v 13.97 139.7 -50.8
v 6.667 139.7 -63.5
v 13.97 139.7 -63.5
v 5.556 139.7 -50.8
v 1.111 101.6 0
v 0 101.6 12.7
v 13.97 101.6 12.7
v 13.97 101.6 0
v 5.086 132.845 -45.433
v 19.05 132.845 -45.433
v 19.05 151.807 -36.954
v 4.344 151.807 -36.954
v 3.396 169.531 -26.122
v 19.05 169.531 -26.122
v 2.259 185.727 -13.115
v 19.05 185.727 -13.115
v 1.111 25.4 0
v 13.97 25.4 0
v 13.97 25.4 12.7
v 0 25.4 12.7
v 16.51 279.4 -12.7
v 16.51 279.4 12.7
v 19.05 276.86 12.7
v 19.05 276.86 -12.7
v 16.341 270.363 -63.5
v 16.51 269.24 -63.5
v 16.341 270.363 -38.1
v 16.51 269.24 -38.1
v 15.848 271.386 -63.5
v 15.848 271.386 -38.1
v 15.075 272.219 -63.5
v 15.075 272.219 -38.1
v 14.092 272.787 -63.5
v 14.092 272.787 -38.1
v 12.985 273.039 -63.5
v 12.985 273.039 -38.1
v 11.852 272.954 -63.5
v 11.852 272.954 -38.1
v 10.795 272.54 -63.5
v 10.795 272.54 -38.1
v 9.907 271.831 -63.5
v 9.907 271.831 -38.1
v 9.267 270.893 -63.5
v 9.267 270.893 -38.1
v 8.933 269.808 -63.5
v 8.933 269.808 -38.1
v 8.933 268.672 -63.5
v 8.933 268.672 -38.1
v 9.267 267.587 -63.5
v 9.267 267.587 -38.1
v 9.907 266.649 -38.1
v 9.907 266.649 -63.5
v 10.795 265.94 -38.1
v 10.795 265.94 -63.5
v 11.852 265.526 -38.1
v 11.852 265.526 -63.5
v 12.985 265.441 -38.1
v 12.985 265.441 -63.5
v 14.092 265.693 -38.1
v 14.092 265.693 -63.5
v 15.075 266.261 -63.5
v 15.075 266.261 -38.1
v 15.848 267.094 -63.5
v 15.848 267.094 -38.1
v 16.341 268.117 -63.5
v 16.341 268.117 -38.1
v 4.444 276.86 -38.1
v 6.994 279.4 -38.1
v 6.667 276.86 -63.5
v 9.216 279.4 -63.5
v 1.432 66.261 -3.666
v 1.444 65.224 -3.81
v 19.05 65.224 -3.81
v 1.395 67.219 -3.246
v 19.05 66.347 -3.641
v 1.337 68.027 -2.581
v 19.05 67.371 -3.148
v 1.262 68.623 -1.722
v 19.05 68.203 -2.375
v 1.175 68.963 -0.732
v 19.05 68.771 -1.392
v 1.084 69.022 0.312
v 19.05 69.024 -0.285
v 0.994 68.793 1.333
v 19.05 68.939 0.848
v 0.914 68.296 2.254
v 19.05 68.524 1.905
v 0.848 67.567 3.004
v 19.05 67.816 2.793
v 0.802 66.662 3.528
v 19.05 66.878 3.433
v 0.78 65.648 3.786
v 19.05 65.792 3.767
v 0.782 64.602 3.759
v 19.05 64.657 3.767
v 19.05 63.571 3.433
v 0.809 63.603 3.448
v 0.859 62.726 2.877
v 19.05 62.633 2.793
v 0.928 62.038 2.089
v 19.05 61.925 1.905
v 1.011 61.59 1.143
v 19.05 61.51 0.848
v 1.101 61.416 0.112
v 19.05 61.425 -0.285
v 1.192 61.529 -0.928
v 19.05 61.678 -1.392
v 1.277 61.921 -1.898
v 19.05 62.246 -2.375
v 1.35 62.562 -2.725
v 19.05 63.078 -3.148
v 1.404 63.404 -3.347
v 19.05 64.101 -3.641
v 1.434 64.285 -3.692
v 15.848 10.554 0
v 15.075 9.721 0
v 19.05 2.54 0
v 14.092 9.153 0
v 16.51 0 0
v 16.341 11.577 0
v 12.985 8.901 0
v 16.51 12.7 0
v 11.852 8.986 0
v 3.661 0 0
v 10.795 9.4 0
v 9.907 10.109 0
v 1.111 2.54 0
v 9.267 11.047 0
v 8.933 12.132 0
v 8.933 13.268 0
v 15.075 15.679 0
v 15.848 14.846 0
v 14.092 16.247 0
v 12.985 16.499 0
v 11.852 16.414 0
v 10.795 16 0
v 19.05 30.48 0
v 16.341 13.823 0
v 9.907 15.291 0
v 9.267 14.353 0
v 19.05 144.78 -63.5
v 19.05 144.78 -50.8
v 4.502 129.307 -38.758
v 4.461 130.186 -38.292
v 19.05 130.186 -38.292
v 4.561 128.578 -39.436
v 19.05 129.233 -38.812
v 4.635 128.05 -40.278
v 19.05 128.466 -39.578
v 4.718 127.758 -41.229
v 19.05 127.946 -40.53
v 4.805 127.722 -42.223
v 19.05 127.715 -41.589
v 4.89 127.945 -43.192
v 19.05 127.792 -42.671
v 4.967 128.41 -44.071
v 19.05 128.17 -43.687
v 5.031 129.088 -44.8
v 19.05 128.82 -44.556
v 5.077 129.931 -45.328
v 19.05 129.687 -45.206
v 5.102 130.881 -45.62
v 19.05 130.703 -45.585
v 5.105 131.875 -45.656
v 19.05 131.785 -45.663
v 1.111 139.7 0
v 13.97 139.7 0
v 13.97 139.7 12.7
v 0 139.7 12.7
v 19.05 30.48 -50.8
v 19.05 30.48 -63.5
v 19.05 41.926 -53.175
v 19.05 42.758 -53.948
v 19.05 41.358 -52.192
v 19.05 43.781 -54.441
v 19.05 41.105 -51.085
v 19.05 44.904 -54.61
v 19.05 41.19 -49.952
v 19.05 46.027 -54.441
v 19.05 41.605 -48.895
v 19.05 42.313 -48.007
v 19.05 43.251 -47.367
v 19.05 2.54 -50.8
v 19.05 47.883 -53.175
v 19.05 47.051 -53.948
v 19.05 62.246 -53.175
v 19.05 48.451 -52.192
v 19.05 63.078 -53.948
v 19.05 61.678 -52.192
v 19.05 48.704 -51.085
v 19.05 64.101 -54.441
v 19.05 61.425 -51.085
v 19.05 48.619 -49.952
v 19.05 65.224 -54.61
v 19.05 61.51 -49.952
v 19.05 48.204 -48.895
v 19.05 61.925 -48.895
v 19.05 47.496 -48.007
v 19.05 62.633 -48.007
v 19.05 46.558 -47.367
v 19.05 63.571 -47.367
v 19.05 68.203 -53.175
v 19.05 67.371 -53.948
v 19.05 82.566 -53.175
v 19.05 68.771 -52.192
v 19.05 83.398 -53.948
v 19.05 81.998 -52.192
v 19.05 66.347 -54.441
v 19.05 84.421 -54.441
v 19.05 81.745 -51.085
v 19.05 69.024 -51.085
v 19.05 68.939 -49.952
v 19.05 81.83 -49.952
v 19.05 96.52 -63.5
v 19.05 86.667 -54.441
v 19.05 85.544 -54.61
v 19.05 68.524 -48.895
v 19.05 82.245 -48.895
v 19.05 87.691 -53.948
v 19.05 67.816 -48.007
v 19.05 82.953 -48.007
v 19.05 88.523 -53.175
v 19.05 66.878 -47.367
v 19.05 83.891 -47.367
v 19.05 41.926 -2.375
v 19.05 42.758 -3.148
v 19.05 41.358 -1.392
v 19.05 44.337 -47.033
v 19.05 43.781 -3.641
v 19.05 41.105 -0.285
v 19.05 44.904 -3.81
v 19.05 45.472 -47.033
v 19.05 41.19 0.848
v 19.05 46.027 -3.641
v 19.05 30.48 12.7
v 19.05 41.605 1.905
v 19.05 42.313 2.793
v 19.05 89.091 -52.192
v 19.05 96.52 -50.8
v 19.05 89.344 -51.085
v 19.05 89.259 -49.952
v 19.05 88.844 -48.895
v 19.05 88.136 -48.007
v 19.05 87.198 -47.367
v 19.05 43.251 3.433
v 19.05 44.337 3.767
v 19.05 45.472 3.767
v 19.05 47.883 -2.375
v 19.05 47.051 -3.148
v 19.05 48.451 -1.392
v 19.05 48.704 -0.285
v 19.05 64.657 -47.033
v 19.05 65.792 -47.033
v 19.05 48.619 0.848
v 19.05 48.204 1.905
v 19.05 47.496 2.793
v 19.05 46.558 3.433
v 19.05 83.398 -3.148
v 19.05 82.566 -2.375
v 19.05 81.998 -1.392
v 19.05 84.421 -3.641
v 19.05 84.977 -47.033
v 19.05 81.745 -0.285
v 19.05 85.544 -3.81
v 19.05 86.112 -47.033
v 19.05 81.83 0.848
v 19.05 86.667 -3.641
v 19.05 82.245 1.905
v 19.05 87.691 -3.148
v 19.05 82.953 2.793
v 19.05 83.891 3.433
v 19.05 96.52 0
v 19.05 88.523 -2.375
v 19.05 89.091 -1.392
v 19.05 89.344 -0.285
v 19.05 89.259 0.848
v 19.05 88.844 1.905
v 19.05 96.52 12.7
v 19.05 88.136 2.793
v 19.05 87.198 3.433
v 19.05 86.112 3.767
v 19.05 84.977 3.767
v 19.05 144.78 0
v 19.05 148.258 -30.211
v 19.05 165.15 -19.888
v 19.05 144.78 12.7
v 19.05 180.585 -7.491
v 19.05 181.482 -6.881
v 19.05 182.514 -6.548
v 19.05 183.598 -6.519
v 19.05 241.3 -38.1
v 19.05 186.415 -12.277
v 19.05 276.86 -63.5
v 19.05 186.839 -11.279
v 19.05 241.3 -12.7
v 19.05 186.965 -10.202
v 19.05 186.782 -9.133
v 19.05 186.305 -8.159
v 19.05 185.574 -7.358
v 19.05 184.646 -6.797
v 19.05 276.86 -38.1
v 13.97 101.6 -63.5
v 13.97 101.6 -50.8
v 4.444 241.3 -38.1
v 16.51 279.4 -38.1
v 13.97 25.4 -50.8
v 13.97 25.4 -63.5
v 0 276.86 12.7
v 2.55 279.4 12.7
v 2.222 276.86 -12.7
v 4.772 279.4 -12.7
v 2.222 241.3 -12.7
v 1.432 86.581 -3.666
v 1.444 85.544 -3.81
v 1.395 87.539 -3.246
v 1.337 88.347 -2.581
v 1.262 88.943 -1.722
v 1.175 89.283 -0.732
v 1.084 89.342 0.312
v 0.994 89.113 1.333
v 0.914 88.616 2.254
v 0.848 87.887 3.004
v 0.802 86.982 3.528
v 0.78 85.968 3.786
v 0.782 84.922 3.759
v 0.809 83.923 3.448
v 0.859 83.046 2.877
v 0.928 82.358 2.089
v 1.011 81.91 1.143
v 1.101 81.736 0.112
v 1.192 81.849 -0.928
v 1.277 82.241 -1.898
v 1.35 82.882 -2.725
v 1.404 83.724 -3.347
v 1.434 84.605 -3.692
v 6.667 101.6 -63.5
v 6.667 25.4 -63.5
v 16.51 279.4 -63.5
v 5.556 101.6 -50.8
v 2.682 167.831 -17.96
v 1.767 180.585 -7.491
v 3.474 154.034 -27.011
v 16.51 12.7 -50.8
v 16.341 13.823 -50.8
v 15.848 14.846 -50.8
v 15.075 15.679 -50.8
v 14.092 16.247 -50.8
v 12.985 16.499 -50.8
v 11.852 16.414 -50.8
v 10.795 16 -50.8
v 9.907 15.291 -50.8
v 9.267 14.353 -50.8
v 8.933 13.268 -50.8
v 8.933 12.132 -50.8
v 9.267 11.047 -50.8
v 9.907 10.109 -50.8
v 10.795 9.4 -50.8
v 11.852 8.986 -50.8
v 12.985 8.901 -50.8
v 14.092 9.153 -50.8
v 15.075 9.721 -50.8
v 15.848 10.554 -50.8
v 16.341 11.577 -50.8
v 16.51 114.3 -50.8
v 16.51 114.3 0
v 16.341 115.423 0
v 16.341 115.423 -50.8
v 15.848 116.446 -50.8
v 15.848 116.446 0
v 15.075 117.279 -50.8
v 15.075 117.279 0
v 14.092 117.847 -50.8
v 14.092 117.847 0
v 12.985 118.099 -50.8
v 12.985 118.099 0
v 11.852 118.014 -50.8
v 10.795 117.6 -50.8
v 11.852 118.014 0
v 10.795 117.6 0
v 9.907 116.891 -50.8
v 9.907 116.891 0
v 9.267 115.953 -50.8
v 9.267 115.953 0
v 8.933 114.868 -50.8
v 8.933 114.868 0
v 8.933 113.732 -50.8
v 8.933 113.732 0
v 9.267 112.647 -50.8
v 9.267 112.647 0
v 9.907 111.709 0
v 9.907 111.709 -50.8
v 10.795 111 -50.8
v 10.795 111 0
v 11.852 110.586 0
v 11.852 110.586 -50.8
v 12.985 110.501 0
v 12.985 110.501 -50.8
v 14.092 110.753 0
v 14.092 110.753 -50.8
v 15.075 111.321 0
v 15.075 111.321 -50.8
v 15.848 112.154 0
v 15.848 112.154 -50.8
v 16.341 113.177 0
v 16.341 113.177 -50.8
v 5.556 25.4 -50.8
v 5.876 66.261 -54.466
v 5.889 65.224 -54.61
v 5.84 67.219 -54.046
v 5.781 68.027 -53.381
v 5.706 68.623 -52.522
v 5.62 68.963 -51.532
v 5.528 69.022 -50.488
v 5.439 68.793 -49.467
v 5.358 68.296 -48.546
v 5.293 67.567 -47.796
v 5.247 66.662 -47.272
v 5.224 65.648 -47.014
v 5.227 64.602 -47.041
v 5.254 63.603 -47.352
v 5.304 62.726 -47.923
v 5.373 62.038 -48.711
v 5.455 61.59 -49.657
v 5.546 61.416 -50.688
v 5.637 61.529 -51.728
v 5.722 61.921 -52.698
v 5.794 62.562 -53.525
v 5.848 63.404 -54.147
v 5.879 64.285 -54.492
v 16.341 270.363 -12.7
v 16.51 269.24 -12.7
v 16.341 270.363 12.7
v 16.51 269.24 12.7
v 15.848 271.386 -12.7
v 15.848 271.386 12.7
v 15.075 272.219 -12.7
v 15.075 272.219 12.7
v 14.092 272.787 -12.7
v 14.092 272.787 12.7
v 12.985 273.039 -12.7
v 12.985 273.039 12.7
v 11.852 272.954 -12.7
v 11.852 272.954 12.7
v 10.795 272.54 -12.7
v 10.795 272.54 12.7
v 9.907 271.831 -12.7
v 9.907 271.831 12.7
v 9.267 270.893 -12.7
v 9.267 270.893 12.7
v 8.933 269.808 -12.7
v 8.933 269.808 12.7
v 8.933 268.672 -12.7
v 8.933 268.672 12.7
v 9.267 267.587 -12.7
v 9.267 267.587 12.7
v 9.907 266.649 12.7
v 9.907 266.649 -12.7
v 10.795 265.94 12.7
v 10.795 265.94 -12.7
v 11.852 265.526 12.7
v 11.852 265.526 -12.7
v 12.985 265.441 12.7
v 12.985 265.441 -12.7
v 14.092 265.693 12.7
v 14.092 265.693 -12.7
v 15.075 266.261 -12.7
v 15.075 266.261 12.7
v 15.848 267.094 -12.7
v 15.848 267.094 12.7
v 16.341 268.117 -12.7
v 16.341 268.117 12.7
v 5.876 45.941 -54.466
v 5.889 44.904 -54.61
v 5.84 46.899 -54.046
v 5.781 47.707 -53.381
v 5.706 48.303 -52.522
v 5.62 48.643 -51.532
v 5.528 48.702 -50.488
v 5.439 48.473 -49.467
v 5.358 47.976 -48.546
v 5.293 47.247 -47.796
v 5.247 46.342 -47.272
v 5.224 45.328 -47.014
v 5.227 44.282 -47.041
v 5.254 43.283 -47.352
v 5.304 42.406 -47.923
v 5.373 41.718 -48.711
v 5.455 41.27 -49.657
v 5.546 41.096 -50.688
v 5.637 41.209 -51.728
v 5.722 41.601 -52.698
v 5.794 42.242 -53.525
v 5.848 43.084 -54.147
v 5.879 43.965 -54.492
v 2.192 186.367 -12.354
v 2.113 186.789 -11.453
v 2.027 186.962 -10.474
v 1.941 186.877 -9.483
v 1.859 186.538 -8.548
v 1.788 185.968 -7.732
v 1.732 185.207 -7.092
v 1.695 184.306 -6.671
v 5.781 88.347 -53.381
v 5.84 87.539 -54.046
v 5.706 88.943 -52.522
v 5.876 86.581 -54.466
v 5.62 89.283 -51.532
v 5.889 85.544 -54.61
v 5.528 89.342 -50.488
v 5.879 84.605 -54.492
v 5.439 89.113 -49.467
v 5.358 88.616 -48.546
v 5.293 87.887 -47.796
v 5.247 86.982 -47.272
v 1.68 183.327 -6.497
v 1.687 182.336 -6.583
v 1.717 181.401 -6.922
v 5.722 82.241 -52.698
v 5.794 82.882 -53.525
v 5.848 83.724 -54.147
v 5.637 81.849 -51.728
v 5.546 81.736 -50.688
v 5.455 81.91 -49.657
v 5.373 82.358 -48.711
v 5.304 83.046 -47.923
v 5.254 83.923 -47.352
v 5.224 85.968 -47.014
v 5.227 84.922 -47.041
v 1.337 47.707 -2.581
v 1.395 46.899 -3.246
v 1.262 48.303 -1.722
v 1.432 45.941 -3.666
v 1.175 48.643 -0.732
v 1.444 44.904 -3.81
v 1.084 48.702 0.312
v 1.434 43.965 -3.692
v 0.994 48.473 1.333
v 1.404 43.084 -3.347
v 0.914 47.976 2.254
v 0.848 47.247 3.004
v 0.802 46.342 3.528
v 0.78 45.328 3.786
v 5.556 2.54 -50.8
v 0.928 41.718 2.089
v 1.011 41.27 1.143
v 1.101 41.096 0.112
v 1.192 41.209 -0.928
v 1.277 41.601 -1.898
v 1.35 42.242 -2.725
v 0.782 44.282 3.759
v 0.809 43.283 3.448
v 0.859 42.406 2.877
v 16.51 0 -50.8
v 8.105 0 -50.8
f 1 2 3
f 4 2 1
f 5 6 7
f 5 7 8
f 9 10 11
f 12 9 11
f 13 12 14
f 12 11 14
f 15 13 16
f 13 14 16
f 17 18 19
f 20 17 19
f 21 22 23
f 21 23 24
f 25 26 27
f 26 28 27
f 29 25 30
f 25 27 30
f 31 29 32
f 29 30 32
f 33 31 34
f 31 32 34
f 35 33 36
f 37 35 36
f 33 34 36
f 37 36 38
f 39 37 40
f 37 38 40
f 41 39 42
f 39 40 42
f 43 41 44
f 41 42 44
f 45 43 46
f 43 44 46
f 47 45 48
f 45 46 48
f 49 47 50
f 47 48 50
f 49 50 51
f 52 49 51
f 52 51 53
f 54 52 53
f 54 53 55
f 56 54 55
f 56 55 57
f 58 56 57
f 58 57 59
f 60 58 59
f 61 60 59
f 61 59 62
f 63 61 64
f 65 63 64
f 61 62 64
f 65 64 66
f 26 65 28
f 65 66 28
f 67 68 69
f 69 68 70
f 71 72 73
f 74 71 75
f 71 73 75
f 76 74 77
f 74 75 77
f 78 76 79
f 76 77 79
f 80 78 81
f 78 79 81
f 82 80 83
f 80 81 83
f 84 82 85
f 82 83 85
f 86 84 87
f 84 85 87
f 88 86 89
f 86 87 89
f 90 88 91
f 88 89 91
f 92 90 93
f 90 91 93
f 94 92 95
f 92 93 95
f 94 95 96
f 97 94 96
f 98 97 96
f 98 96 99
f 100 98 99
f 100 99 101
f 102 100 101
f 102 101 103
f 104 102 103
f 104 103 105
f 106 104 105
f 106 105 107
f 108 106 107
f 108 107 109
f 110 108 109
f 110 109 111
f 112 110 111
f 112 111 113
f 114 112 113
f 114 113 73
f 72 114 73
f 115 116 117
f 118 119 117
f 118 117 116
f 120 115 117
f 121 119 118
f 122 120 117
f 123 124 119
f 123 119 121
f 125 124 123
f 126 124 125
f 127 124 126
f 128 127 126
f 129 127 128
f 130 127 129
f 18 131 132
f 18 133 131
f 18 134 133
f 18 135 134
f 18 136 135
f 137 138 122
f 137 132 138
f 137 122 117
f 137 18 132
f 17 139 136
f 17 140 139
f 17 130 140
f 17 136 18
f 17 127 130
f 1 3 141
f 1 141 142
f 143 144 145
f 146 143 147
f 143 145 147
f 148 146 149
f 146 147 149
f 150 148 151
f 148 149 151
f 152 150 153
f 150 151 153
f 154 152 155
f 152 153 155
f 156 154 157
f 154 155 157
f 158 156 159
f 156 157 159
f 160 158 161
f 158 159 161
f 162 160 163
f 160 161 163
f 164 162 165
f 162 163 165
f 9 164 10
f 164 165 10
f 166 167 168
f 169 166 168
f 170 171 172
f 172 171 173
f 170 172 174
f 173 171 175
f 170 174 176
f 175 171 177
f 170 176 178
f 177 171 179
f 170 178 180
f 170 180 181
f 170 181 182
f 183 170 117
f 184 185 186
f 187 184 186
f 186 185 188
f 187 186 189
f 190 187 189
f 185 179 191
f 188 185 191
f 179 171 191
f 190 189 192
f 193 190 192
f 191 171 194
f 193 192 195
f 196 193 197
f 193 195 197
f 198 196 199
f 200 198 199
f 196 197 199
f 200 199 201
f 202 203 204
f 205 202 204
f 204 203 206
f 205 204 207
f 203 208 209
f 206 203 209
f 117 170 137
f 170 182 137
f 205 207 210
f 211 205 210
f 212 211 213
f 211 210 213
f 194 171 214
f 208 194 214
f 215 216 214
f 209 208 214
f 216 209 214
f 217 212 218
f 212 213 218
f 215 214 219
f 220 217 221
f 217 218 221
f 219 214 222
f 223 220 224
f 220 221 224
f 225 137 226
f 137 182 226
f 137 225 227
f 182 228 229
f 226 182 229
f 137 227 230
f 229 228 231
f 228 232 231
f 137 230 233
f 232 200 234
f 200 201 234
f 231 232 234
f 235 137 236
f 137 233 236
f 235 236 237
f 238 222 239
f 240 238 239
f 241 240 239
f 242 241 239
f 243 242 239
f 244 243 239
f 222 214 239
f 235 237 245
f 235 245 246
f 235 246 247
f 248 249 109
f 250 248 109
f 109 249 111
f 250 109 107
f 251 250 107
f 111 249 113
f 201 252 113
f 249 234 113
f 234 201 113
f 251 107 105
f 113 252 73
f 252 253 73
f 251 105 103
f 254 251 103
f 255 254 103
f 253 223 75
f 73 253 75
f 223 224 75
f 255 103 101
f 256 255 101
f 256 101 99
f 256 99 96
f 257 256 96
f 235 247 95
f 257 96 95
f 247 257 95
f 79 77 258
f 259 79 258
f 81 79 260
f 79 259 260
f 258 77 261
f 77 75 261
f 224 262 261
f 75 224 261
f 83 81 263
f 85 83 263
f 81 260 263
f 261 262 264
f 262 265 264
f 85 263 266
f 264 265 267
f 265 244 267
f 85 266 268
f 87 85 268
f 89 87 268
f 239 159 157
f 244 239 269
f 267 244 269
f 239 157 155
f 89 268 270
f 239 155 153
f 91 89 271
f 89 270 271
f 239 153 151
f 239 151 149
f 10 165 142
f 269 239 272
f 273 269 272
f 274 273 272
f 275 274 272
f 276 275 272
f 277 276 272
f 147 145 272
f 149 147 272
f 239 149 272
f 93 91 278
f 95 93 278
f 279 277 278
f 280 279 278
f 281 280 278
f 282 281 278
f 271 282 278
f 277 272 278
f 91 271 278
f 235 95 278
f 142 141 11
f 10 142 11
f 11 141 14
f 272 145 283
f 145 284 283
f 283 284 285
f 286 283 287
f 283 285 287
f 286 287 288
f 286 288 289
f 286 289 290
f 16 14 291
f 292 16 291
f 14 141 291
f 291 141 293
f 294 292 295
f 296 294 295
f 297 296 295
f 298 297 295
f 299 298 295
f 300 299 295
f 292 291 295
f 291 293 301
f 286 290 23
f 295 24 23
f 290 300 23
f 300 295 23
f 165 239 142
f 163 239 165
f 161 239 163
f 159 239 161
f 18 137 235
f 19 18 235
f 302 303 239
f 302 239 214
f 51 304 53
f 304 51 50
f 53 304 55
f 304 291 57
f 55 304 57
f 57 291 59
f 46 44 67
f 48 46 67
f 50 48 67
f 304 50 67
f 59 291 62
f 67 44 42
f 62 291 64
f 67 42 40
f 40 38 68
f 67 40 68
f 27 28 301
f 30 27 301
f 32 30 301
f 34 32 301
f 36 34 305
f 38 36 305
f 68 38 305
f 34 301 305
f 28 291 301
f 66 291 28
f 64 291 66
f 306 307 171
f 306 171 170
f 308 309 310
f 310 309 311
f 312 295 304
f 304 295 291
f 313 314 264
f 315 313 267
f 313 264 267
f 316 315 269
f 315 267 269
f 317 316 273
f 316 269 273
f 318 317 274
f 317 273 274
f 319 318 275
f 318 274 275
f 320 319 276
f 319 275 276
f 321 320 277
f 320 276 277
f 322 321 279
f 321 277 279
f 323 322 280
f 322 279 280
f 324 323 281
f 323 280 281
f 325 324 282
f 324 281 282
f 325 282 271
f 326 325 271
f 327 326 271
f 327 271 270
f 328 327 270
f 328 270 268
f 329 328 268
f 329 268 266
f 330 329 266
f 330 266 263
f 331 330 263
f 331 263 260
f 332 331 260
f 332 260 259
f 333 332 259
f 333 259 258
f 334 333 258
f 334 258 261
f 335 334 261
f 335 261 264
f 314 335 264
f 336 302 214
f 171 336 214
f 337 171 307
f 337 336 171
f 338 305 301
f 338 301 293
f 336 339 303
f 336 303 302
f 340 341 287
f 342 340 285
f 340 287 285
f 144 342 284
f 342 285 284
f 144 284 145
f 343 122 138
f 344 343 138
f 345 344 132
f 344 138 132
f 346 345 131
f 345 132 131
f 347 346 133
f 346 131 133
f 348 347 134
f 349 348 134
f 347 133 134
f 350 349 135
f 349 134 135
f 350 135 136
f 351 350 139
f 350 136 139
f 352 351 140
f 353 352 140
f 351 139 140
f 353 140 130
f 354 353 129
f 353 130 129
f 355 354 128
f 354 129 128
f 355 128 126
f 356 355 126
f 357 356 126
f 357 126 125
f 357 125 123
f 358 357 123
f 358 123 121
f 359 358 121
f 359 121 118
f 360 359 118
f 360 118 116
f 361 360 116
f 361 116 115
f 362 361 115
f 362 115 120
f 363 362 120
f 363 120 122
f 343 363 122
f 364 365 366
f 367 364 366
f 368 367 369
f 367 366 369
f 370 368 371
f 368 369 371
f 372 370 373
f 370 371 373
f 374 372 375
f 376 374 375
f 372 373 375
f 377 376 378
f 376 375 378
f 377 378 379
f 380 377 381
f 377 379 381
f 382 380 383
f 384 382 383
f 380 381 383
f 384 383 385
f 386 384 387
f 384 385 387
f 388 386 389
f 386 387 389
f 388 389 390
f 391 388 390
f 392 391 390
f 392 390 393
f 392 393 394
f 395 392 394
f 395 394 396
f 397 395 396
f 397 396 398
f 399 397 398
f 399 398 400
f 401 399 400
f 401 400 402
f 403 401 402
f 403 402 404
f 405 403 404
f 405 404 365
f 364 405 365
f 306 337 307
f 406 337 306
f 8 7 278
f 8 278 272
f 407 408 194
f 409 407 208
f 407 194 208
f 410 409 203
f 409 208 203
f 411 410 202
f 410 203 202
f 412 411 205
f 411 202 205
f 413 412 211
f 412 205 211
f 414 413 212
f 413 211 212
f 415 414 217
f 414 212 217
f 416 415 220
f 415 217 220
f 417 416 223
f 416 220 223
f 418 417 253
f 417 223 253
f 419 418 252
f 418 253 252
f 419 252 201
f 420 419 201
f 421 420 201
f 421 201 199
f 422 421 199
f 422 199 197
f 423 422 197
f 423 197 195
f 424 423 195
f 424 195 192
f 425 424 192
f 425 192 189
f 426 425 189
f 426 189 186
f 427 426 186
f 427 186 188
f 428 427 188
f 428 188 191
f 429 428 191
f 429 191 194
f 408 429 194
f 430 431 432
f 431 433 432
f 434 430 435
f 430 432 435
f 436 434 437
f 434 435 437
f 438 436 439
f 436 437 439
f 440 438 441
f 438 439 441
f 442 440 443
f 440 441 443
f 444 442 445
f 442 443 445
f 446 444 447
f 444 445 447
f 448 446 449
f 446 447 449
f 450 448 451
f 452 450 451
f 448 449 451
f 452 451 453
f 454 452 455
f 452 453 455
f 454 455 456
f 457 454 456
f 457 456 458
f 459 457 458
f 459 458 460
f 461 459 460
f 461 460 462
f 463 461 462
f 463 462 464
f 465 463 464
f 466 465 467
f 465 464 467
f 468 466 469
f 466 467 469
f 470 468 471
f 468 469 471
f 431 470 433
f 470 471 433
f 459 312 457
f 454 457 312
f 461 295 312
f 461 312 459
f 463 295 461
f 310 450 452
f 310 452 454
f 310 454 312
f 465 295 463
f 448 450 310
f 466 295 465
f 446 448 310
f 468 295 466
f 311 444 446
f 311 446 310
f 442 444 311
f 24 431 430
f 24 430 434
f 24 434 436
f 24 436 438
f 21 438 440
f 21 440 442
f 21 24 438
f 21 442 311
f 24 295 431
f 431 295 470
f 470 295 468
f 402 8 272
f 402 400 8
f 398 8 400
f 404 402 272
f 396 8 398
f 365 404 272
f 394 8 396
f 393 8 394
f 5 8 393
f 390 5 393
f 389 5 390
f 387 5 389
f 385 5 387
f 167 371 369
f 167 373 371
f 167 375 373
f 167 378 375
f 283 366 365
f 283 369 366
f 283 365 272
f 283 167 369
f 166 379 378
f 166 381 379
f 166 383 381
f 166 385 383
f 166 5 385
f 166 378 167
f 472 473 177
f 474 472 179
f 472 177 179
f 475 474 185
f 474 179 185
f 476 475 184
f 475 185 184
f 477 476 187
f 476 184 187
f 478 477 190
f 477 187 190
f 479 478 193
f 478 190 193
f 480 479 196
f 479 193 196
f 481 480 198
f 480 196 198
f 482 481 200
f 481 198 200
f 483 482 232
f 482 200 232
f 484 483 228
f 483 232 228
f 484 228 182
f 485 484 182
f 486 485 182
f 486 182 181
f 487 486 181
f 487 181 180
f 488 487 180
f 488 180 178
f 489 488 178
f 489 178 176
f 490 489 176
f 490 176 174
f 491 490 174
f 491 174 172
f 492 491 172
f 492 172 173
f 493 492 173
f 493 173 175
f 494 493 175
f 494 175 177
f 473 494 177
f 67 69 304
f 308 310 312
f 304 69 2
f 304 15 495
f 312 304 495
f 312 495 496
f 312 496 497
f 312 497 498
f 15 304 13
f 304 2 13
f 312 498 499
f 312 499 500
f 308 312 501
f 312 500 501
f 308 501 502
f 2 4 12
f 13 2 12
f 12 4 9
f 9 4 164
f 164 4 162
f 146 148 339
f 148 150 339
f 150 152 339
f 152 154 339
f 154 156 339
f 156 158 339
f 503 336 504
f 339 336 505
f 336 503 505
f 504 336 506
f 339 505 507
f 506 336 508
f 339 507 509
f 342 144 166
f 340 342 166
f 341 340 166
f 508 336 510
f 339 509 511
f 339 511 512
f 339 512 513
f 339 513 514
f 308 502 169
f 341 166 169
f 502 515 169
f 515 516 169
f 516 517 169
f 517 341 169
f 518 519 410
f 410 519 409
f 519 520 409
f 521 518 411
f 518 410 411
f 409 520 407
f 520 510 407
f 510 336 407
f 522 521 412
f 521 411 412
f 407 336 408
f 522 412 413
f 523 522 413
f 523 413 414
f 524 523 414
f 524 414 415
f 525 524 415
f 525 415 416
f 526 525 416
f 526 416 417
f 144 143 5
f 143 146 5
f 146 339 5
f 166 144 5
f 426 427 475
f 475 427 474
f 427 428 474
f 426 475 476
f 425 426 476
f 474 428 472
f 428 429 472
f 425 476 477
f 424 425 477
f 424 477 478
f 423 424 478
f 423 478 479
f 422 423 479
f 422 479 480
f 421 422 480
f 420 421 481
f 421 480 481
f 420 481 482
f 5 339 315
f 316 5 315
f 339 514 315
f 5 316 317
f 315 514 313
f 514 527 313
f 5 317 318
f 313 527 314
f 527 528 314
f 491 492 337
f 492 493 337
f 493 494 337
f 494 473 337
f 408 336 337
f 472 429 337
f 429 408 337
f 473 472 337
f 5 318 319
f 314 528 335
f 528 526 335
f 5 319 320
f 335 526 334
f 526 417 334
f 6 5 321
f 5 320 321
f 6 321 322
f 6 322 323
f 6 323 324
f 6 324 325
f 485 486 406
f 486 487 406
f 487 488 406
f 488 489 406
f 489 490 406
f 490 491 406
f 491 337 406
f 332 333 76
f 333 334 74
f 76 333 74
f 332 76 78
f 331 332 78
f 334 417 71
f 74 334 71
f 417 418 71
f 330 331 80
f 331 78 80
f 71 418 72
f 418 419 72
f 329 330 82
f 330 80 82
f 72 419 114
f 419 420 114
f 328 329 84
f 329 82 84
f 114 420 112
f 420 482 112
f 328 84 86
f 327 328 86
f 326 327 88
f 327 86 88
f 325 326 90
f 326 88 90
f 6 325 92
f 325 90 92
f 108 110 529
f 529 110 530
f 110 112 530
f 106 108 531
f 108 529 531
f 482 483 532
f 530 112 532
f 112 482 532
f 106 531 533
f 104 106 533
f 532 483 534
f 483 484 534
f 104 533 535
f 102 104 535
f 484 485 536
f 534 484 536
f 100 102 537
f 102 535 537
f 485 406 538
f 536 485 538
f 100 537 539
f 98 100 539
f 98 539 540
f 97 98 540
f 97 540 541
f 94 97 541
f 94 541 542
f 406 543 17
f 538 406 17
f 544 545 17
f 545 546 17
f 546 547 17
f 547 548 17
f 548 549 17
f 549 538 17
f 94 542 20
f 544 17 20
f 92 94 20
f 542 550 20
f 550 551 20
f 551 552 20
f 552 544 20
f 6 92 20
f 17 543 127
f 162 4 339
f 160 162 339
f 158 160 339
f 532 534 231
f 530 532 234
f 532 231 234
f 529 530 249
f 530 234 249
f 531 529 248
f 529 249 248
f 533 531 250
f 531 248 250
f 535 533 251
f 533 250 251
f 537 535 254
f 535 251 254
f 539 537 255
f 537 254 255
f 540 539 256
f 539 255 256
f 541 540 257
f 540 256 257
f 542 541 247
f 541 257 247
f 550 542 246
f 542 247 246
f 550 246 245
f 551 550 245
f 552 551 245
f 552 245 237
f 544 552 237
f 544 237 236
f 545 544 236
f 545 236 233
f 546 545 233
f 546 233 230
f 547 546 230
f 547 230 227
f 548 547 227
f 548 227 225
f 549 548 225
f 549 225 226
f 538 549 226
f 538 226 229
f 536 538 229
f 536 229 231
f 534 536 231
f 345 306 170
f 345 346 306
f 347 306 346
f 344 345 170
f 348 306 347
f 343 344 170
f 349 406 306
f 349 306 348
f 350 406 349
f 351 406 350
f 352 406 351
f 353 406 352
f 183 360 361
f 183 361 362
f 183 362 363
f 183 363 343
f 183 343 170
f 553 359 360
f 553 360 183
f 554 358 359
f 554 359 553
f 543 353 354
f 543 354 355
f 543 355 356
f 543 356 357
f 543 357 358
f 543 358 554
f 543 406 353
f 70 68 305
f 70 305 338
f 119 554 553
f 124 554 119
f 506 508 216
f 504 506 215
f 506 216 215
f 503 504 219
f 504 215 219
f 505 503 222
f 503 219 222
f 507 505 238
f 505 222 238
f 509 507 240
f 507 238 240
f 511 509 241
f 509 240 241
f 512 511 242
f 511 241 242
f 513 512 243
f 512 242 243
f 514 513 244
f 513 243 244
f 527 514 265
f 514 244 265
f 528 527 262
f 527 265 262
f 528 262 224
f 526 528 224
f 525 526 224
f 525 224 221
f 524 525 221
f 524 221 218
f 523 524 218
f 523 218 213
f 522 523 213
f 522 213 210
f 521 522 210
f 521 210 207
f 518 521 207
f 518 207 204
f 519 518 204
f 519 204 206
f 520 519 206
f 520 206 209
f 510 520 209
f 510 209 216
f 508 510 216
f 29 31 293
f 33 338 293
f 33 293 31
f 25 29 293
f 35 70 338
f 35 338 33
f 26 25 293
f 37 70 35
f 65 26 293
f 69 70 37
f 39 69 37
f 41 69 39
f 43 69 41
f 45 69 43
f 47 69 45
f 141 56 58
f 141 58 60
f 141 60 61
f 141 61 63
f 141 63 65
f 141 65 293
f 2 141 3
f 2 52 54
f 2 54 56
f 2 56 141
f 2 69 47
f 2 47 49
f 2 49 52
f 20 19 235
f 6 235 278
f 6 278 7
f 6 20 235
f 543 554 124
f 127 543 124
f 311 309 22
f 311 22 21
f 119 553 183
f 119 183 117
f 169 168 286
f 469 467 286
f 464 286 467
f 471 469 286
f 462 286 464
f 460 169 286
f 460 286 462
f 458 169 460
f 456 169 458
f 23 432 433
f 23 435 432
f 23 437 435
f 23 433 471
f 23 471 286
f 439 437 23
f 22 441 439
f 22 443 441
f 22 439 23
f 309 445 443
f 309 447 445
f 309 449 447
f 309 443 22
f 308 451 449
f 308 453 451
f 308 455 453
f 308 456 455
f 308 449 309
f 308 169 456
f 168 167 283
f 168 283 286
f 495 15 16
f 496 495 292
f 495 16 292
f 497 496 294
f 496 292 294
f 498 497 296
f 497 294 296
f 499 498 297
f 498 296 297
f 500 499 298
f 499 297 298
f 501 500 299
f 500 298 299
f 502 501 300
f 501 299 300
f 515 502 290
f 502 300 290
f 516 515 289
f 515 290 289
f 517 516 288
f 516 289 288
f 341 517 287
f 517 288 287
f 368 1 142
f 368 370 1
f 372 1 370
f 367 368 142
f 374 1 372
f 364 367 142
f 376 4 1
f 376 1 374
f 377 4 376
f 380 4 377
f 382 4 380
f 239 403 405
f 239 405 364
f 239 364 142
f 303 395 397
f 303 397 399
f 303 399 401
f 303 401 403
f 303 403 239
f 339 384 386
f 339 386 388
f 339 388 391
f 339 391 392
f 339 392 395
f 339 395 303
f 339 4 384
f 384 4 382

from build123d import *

# Parameters (mm, degrees)
BOSS_EXTRUDE1_DEPTH = 19.05
SKETCH2_R           = 3.81
CUT_EXTRUDE1_DEPTH  = 64.5
SKETCH3_R           = 3.81
CUT_EXTRUDE2_DEPTH  = 64.5
CUT_EXTRUDE3_DEPTH  = 20.05
SKETCH6_R           = 3.81
CUT_EXTRUDE4_DEPTH  = 20.05
LPATTERN1_COUNT     = 3
LPATTERN1_PITCH     = 20.32
SKETCH7_W           = 25.4
SKETCH7_H           = 38.1
CUT_EXTRUDE5_DEPTH  = 20.05
CUT_EXTRUDE6_DEPTH  = 280.4
SKETCH9_R           = 3.81
CUT_EXTRUDE7_DEPTH  = 76.2
CHAMFER1_SIZE       = 2.54
CHAMFER2_SIZE       = 5.08


with BuildPart() as part:
    # Sketch1 → Boss-Extrude1 (new body)
    with BuildSketch(Plane(origin=(0, 0, 0), x_dir=(0, 0, -1), z_dir=(1, 0, 0))):
        Polygon((0, 0), (0, 25.4), (-12.7, 25.4), (-12.7, 101.6), (0, 101.6), (0, 139.7), (-12.7, 139.7), (-12.7, 279.4), (63.5, 279.4), (63.5, 139.7), (50.8, 139.7), (50.8, 101.6), (63.5, 101.6), (63.5, 25.4), (50.8, 25.4), (50.8, 0), align=None)
    extrude(amount=BOSS_EXTRUDE1_DEPTH)

    # Sketch2 → Cut-Extrude1 (cut, through all)
    with BuildSketch(Plane.XY):
        with Locations((12.7, 114.3)):
            Circle(SKETCH2_R)
    extrude(amount=-CUT_EXTRUDE1_DEPTH, mode=Mode.SUBTRACT)

    # Sketch3 → Cut-Extrude2 (cut, through all)
    with BuildSketch(Plane.XY):
        with Locations((12.7, 12.7)):
            Circle(SKETCH3_R)
    extrude(amount=-CUT_EXTRUDE2_DEPTH, mode=Mode.SUBTRACT)

    # Sketch4 → Cut-Extrude3 (cut, through all)
    with BuildSketch(Plane(origin=(19.05, 0, 0), x_dir=(0, 0, -1), z_dir=(1, 0, 0))):
        with BuildLine():
            ThreePointArc((45.433317408, 132.844708156), (31.8216378, 160.842664311), (13.115249698, 185.727085439))
            ThreePointArc((13.115249698, 185.727085439), (7.732489274, 185.968104562), (7.491470151, 180.585344138))
            ThreePointArc((7.491470151, 180.585344138), (25.319688182, 156.869120406), (38.292368451, 130.185526327))
            ThreePointArc((38.292368451, 130.185526327), (43.192433844, 127.944642763), (45.433317408, 132.844708156))
        make_face()
    extrude(amount=-CUT_EXTRUDE3_DEPTH, mode=Mode.SUBTRACT)

    # Sketch6 → Cut-Extrude4 (cut, through all)
    with BuildSketch(Plane(origin=(19.05, 0, 0), x_dir=(0, 0, -1), z_dir=(1, 0, 0))):
        with Locations((0, 44.904409269)):
            Circle(SKETCH6_R)
        with Locations((50.8, 44.904409269)):
            Circle(SKETCH6_R)
    cut_extrude4 = extrude(amount=-CUT_EXTRUDE4_DEPTH, mode=Mode.SUBTRACT)

    # LPattern1: Cut-Extrude4 ×3
    with Locations(*[(0, i * LPATTERN1_PITCH, 0) for i in range(1, LPATTERN1_COUNT)]):
        add(cut_extrude4, mode=Mode.SUBTRACT)

    # Sketch7 → Cut-Extrude5 (cut, through all)
    with BuildSketch(Plane(origin=(19.05, 0, 0), x_dir=(0, 0, -1), z_dir=(1, 0, 0))):
        with Locations((25.4, 260.35)):
            Rectangle(SKETCH7_W, SKETCH7_H)
    extrude(amount=-CUT_EXTRUDE5_DEPTH, mode=Mode.SUBTRACT)

    # Sketch8 → Cut-Extrude6 (cut, through all)
    with BuildSketch(Plane(origin=(0, 0, 0), x_dir=(1, 0, 0), z_dir=(0, 1, 0))):
        Polygon((0, 63.5), (6.666636161, 63.5), (0, -12.7), align=None)
    extrude(amount=CUT_EXTRUDE6_DEPTH, mode=Mode.SUBTRACT)

    # Sketch9 → Cut-Extrude7 (cut, symmetric)
    with BuildSketch(Plane.XY):
        with Locations((12.7, 269.24)):
            Circle(SKETCH9_R)
    extrude(amount=CUT_EXTRUDE7_DEPTH, both=True, mode=Mode.SUBTRACT)

    # Chamfer1
    chamfer1_edges = [part.edges().sort_by_distance(p)[0] for p in [
        (1.111106027, 279.4, 0),
        (5.555530134, 279.4, -50.8),
        (3.33331808, 0, -25.4),
        (19.05, 279.4, -50.8),
        (19.05, 0, -25.4),
        (19.05, 279.4, 0),
    ]]
    chamfer(chamfer1_edges, length=CHAMFER1_SIZE)

    # Chamfer2
    chamfer2_edges = [part.edges().sort_by_distance(p)[0] for p in [
        (19.05, 25.4, -57.15),
        (19.05, 101.6, -57.15),
        (19.05, 139.7, -57.15),
        (19.05, 139.7, 6.35),
        (19.05, 101.6, 6.35),
        (19.05, 25.4, 6.35),
    ]]
    chamfer(chamfer2_edges, length=CHAMFER2_SIZE)


solid = part.part
